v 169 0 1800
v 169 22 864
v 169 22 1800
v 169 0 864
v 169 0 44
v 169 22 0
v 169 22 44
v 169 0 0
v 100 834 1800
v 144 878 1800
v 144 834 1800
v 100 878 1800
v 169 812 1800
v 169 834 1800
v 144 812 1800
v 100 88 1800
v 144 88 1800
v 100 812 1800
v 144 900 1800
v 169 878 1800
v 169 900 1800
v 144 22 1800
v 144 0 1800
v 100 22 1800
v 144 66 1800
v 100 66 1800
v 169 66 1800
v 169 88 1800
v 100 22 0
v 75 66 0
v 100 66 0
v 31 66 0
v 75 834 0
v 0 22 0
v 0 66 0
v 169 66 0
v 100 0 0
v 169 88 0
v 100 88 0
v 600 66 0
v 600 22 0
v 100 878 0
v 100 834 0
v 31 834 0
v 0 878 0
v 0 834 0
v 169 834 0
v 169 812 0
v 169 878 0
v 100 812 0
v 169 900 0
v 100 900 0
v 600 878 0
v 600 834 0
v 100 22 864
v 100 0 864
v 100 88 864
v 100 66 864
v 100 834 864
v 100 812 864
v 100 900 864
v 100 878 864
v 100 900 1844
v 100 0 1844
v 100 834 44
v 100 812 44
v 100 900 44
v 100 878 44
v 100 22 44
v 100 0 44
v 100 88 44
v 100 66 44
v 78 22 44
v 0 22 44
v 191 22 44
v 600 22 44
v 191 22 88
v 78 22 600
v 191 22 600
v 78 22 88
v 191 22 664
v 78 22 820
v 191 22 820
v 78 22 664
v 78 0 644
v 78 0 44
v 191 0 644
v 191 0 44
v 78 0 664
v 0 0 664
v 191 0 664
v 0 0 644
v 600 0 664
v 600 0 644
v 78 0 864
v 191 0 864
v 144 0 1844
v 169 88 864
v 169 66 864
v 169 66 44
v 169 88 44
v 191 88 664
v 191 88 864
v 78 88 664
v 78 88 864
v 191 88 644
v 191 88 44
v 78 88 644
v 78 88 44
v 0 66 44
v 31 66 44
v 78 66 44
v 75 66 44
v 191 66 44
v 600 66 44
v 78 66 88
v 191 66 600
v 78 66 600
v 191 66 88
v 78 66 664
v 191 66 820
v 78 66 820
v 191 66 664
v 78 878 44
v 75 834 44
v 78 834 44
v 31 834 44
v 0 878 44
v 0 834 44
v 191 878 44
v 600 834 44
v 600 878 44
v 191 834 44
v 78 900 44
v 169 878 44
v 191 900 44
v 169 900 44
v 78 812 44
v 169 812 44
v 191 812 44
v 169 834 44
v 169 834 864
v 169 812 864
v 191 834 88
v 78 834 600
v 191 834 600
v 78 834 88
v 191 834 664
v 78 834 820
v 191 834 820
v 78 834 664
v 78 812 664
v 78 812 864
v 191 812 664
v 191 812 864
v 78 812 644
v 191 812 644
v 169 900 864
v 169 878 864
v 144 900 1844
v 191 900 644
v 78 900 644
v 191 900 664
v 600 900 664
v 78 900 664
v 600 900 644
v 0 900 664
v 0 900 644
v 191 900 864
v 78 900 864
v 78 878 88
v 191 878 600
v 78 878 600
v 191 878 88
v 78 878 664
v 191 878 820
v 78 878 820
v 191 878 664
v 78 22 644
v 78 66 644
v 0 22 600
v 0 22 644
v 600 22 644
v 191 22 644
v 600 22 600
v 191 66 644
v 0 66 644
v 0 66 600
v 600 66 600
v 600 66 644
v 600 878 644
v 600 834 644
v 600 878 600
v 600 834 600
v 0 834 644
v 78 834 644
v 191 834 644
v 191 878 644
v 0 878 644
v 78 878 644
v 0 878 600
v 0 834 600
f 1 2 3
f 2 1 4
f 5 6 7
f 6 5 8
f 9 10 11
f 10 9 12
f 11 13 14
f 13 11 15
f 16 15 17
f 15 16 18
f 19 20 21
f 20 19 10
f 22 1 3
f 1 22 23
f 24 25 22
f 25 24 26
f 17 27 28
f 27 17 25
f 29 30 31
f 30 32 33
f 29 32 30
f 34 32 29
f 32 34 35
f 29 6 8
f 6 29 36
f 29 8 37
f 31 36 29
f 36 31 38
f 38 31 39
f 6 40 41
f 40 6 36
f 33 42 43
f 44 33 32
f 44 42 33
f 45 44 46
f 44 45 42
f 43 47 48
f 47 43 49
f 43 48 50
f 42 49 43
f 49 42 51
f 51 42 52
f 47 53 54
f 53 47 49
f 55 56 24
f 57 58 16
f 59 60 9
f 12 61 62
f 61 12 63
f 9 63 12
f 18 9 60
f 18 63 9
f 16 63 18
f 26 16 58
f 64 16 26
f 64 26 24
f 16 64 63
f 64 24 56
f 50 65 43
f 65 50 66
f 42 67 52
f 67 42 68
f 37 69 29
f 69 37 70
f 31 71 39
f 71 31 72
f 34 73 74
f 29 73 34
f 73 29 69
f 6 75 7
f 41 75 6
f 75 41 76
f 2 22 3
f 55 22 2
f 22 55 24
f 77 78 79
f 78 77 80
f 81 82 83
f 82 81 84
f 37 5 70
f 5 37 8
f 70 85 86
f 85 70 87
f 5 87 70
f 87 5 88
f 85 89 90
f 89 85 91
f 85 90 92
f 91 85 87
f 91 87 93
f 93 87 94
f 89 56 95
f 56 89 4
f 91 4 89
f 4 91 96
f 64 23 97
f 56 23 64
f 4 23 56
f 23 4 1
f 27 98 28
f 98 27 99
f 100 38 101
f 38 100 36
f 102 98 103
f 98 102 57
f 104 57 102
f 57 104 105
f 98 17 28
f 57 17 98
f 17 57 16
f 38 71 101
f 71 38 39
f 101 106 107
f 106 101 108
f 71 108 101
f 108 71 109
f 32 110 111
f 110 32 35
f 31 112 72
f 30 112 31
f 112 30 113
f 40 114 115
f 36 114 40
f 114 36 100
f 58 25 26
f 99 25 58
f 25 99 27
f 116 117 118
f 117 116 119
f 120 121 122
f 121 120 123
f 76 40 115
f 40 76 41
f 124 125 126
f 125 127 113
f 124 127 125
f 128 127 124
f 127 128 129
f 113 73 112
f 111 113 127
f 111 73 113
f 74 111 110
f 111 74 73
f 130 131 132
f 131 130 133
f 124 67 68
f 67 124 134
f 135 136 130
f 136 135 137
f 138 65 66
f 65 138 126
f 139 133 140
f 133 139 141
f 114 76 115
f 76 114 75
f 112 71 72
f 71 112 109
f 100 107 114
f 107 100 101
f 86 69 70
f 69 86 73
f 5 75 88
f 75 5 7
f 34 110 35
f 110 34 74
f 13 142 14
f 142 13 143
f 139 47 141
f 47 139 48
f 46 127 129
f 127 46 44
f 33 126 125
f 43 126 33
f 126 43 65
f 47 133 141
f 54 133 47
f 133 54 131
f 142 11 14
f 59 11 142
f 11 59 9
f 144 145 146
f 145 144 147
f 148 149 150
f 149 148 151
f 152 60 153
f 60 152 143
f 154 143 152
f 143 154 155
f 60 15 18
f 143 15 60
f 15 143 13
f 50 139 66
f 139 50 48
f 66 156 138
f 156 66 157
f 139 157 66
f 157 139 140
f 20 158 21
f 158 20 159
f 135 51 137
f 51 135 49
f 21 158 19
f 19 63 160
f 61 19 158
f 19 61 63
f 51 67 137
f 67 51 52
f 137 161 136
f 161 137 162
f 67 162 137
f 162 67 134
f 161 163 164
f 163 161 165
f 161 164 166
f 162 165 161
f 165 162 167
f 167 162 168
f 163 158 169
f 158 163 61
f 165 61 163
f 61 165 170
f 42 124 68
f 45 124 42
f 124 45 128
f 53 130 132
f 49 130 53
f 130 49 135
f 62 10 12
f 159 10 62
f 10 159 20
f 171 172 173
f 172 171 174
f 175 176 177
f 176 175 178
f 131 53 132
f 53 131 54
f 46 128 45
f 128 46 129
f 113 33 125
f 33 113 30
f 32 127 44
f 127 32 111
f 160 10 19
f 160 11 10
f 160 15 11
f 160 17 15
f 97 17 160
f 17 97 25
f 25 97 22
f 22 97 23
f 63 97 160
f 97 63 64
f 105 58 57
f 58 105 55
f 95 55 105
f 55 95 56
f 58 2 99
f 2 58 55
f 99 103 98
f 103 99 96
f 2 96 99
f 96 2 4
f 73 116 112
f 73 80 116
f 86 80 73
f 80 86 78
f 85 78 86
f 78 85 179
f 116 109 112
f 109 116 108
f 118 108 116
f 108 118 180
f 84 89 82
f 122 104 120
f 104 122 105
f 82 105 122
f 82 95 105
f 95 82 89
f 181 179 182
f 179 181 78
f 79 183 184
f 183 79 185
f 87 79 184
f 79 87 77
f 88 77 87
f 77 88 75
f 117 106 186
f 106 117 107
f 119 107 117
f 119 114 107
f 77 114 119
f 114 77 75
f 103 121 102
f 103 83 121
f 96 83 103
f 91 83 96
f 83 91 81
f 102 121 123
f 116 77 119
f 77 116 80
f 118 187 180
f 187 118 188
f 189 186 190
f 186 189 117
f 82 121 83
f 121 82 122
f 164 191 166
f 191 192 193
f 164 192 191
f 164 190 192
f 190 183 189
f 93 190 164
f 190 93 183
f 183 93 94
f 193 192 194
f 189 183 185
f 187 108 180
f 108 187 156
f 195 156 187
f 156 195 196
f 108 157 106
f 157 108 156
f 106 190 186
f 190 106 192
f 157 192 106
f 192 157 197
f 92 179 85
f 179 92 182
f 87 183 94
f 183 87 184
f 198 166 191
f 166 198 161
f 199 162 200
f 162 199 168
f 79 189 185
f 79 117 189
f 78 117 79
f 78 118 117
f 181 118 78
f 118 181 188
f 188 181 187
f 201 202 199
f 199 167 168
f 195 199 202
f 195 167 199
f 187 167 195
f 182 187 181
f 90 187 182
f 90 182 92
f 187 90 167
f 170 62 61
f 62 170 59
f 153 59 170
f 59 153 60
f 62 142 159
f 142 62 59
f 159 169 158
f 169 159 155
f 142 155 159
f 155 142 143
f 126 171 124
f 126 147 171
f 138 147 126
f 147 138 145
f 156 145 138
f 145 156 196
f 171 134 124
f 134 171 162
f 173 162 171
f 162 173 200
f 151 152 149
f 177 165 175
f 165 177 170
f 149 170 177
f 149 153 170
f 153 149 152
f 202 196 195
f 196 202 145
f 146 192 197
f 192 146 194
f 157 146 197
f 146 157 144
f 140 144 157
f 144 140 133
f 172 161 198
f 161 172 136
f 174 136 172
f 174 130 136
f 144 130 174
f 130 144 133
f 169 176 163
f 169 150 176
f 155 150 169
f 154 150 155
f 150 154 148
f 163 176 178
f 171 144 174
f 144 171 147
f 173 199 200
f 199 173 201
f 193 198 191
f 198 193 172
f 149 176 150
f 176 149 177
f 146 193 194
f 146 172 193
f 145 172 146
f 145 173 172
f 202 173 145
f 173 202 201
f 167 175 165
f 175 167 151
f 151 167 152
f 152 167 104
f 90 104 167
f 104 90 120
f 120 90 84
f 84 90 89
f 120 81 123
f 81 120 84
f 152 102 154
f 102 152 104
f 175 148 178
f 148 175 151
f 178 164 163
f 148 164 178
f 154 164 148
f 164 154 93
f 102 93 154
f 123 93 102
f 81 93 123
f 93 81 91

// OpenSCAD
dx = 600;
dy = 900;
dzl = 600;
dzh = 1100;

x=0;
y=1;
z=2;

inlegy=44; // inside the leg width
ls=[69,22,1800];
ss=[dx,inlegy,inlegy];
apronsupport=[dx,inlegy,inlegy];
tixs=220;
iss=[22,22,dzl + tixs];
dfb=100;
crosssupport=[iss[x] + iss[x] + ls[x],inlegy,inlegy];

module leg(d){
     translate(d){
          translate([0,ls[y],0]) cube(apronsupport);
          translate([dfb,0,0]){
               cube(ls);
               translate([0,ls[y] + ss[y],0]) cube(ls);
          }
     }
}

module base(){
     leg([0,0,0]);
     leg([0,dy - (ls[y] + ls[y] + ss[y]),0]);
     translate([dfb - ls[x],inlegy + ls[y],0]) cube([inlegy, dy - 2*inlegy - 2*ls[y], inlegy]); //bottom cross support
     translate([dfb,0,ls[z]]) cube([inlegy, dy, inlegy]); // top cross support
}

module apronmiddle(d){
     translate(d){
          translate([0,ls[y],0]) cube(apronsupport);
          translate([dfb,0,0]){
               translate([-iss[x], iss[y], ss[z]-dzl]) cube(crosssupport); // cross support bottom
               translate([-iss[x], iss[y], ss[z]-dzl+iss[z]-crosssupport[z]]) cube(crosssupport); // cross support bottom
          }
     }
}

module apronouty(d){
     translate(d){
          translate([dfb,0,0]){
               translate([-iss[x],ls[y] + ss[y], -dzl + ss[z]]) cube(iss);
               translate([ls[x],ls[y] + ss[y], -dzl + ss[z]]) cube(iss);
         }
     }
}

module aproniny(d){
     translate(d){
          translate([dfb,0,0]){
               translate([-iss[x],0, -dzl + ss[z]]) cube(iss);
               translate([ls[x],0, -dzl + ss[z]]) cube(iss);
          }
     }
}

module apron(d){
     aproniny(d);
     apronmiddle(d);
     apronouty(d);
}

module top(d){
     translate(d){
          apron([0,0,0]); // leg iny
          apron([0,dy - (ls[y] + ls[y] + ss[y]),0]); //leg outy
          translate([0,0,apronsupport[z]]) cube([dx,dy,20]); // table top
     }
}

base();
top([0,0,dzl]);
//top([0,0,dzh]);
